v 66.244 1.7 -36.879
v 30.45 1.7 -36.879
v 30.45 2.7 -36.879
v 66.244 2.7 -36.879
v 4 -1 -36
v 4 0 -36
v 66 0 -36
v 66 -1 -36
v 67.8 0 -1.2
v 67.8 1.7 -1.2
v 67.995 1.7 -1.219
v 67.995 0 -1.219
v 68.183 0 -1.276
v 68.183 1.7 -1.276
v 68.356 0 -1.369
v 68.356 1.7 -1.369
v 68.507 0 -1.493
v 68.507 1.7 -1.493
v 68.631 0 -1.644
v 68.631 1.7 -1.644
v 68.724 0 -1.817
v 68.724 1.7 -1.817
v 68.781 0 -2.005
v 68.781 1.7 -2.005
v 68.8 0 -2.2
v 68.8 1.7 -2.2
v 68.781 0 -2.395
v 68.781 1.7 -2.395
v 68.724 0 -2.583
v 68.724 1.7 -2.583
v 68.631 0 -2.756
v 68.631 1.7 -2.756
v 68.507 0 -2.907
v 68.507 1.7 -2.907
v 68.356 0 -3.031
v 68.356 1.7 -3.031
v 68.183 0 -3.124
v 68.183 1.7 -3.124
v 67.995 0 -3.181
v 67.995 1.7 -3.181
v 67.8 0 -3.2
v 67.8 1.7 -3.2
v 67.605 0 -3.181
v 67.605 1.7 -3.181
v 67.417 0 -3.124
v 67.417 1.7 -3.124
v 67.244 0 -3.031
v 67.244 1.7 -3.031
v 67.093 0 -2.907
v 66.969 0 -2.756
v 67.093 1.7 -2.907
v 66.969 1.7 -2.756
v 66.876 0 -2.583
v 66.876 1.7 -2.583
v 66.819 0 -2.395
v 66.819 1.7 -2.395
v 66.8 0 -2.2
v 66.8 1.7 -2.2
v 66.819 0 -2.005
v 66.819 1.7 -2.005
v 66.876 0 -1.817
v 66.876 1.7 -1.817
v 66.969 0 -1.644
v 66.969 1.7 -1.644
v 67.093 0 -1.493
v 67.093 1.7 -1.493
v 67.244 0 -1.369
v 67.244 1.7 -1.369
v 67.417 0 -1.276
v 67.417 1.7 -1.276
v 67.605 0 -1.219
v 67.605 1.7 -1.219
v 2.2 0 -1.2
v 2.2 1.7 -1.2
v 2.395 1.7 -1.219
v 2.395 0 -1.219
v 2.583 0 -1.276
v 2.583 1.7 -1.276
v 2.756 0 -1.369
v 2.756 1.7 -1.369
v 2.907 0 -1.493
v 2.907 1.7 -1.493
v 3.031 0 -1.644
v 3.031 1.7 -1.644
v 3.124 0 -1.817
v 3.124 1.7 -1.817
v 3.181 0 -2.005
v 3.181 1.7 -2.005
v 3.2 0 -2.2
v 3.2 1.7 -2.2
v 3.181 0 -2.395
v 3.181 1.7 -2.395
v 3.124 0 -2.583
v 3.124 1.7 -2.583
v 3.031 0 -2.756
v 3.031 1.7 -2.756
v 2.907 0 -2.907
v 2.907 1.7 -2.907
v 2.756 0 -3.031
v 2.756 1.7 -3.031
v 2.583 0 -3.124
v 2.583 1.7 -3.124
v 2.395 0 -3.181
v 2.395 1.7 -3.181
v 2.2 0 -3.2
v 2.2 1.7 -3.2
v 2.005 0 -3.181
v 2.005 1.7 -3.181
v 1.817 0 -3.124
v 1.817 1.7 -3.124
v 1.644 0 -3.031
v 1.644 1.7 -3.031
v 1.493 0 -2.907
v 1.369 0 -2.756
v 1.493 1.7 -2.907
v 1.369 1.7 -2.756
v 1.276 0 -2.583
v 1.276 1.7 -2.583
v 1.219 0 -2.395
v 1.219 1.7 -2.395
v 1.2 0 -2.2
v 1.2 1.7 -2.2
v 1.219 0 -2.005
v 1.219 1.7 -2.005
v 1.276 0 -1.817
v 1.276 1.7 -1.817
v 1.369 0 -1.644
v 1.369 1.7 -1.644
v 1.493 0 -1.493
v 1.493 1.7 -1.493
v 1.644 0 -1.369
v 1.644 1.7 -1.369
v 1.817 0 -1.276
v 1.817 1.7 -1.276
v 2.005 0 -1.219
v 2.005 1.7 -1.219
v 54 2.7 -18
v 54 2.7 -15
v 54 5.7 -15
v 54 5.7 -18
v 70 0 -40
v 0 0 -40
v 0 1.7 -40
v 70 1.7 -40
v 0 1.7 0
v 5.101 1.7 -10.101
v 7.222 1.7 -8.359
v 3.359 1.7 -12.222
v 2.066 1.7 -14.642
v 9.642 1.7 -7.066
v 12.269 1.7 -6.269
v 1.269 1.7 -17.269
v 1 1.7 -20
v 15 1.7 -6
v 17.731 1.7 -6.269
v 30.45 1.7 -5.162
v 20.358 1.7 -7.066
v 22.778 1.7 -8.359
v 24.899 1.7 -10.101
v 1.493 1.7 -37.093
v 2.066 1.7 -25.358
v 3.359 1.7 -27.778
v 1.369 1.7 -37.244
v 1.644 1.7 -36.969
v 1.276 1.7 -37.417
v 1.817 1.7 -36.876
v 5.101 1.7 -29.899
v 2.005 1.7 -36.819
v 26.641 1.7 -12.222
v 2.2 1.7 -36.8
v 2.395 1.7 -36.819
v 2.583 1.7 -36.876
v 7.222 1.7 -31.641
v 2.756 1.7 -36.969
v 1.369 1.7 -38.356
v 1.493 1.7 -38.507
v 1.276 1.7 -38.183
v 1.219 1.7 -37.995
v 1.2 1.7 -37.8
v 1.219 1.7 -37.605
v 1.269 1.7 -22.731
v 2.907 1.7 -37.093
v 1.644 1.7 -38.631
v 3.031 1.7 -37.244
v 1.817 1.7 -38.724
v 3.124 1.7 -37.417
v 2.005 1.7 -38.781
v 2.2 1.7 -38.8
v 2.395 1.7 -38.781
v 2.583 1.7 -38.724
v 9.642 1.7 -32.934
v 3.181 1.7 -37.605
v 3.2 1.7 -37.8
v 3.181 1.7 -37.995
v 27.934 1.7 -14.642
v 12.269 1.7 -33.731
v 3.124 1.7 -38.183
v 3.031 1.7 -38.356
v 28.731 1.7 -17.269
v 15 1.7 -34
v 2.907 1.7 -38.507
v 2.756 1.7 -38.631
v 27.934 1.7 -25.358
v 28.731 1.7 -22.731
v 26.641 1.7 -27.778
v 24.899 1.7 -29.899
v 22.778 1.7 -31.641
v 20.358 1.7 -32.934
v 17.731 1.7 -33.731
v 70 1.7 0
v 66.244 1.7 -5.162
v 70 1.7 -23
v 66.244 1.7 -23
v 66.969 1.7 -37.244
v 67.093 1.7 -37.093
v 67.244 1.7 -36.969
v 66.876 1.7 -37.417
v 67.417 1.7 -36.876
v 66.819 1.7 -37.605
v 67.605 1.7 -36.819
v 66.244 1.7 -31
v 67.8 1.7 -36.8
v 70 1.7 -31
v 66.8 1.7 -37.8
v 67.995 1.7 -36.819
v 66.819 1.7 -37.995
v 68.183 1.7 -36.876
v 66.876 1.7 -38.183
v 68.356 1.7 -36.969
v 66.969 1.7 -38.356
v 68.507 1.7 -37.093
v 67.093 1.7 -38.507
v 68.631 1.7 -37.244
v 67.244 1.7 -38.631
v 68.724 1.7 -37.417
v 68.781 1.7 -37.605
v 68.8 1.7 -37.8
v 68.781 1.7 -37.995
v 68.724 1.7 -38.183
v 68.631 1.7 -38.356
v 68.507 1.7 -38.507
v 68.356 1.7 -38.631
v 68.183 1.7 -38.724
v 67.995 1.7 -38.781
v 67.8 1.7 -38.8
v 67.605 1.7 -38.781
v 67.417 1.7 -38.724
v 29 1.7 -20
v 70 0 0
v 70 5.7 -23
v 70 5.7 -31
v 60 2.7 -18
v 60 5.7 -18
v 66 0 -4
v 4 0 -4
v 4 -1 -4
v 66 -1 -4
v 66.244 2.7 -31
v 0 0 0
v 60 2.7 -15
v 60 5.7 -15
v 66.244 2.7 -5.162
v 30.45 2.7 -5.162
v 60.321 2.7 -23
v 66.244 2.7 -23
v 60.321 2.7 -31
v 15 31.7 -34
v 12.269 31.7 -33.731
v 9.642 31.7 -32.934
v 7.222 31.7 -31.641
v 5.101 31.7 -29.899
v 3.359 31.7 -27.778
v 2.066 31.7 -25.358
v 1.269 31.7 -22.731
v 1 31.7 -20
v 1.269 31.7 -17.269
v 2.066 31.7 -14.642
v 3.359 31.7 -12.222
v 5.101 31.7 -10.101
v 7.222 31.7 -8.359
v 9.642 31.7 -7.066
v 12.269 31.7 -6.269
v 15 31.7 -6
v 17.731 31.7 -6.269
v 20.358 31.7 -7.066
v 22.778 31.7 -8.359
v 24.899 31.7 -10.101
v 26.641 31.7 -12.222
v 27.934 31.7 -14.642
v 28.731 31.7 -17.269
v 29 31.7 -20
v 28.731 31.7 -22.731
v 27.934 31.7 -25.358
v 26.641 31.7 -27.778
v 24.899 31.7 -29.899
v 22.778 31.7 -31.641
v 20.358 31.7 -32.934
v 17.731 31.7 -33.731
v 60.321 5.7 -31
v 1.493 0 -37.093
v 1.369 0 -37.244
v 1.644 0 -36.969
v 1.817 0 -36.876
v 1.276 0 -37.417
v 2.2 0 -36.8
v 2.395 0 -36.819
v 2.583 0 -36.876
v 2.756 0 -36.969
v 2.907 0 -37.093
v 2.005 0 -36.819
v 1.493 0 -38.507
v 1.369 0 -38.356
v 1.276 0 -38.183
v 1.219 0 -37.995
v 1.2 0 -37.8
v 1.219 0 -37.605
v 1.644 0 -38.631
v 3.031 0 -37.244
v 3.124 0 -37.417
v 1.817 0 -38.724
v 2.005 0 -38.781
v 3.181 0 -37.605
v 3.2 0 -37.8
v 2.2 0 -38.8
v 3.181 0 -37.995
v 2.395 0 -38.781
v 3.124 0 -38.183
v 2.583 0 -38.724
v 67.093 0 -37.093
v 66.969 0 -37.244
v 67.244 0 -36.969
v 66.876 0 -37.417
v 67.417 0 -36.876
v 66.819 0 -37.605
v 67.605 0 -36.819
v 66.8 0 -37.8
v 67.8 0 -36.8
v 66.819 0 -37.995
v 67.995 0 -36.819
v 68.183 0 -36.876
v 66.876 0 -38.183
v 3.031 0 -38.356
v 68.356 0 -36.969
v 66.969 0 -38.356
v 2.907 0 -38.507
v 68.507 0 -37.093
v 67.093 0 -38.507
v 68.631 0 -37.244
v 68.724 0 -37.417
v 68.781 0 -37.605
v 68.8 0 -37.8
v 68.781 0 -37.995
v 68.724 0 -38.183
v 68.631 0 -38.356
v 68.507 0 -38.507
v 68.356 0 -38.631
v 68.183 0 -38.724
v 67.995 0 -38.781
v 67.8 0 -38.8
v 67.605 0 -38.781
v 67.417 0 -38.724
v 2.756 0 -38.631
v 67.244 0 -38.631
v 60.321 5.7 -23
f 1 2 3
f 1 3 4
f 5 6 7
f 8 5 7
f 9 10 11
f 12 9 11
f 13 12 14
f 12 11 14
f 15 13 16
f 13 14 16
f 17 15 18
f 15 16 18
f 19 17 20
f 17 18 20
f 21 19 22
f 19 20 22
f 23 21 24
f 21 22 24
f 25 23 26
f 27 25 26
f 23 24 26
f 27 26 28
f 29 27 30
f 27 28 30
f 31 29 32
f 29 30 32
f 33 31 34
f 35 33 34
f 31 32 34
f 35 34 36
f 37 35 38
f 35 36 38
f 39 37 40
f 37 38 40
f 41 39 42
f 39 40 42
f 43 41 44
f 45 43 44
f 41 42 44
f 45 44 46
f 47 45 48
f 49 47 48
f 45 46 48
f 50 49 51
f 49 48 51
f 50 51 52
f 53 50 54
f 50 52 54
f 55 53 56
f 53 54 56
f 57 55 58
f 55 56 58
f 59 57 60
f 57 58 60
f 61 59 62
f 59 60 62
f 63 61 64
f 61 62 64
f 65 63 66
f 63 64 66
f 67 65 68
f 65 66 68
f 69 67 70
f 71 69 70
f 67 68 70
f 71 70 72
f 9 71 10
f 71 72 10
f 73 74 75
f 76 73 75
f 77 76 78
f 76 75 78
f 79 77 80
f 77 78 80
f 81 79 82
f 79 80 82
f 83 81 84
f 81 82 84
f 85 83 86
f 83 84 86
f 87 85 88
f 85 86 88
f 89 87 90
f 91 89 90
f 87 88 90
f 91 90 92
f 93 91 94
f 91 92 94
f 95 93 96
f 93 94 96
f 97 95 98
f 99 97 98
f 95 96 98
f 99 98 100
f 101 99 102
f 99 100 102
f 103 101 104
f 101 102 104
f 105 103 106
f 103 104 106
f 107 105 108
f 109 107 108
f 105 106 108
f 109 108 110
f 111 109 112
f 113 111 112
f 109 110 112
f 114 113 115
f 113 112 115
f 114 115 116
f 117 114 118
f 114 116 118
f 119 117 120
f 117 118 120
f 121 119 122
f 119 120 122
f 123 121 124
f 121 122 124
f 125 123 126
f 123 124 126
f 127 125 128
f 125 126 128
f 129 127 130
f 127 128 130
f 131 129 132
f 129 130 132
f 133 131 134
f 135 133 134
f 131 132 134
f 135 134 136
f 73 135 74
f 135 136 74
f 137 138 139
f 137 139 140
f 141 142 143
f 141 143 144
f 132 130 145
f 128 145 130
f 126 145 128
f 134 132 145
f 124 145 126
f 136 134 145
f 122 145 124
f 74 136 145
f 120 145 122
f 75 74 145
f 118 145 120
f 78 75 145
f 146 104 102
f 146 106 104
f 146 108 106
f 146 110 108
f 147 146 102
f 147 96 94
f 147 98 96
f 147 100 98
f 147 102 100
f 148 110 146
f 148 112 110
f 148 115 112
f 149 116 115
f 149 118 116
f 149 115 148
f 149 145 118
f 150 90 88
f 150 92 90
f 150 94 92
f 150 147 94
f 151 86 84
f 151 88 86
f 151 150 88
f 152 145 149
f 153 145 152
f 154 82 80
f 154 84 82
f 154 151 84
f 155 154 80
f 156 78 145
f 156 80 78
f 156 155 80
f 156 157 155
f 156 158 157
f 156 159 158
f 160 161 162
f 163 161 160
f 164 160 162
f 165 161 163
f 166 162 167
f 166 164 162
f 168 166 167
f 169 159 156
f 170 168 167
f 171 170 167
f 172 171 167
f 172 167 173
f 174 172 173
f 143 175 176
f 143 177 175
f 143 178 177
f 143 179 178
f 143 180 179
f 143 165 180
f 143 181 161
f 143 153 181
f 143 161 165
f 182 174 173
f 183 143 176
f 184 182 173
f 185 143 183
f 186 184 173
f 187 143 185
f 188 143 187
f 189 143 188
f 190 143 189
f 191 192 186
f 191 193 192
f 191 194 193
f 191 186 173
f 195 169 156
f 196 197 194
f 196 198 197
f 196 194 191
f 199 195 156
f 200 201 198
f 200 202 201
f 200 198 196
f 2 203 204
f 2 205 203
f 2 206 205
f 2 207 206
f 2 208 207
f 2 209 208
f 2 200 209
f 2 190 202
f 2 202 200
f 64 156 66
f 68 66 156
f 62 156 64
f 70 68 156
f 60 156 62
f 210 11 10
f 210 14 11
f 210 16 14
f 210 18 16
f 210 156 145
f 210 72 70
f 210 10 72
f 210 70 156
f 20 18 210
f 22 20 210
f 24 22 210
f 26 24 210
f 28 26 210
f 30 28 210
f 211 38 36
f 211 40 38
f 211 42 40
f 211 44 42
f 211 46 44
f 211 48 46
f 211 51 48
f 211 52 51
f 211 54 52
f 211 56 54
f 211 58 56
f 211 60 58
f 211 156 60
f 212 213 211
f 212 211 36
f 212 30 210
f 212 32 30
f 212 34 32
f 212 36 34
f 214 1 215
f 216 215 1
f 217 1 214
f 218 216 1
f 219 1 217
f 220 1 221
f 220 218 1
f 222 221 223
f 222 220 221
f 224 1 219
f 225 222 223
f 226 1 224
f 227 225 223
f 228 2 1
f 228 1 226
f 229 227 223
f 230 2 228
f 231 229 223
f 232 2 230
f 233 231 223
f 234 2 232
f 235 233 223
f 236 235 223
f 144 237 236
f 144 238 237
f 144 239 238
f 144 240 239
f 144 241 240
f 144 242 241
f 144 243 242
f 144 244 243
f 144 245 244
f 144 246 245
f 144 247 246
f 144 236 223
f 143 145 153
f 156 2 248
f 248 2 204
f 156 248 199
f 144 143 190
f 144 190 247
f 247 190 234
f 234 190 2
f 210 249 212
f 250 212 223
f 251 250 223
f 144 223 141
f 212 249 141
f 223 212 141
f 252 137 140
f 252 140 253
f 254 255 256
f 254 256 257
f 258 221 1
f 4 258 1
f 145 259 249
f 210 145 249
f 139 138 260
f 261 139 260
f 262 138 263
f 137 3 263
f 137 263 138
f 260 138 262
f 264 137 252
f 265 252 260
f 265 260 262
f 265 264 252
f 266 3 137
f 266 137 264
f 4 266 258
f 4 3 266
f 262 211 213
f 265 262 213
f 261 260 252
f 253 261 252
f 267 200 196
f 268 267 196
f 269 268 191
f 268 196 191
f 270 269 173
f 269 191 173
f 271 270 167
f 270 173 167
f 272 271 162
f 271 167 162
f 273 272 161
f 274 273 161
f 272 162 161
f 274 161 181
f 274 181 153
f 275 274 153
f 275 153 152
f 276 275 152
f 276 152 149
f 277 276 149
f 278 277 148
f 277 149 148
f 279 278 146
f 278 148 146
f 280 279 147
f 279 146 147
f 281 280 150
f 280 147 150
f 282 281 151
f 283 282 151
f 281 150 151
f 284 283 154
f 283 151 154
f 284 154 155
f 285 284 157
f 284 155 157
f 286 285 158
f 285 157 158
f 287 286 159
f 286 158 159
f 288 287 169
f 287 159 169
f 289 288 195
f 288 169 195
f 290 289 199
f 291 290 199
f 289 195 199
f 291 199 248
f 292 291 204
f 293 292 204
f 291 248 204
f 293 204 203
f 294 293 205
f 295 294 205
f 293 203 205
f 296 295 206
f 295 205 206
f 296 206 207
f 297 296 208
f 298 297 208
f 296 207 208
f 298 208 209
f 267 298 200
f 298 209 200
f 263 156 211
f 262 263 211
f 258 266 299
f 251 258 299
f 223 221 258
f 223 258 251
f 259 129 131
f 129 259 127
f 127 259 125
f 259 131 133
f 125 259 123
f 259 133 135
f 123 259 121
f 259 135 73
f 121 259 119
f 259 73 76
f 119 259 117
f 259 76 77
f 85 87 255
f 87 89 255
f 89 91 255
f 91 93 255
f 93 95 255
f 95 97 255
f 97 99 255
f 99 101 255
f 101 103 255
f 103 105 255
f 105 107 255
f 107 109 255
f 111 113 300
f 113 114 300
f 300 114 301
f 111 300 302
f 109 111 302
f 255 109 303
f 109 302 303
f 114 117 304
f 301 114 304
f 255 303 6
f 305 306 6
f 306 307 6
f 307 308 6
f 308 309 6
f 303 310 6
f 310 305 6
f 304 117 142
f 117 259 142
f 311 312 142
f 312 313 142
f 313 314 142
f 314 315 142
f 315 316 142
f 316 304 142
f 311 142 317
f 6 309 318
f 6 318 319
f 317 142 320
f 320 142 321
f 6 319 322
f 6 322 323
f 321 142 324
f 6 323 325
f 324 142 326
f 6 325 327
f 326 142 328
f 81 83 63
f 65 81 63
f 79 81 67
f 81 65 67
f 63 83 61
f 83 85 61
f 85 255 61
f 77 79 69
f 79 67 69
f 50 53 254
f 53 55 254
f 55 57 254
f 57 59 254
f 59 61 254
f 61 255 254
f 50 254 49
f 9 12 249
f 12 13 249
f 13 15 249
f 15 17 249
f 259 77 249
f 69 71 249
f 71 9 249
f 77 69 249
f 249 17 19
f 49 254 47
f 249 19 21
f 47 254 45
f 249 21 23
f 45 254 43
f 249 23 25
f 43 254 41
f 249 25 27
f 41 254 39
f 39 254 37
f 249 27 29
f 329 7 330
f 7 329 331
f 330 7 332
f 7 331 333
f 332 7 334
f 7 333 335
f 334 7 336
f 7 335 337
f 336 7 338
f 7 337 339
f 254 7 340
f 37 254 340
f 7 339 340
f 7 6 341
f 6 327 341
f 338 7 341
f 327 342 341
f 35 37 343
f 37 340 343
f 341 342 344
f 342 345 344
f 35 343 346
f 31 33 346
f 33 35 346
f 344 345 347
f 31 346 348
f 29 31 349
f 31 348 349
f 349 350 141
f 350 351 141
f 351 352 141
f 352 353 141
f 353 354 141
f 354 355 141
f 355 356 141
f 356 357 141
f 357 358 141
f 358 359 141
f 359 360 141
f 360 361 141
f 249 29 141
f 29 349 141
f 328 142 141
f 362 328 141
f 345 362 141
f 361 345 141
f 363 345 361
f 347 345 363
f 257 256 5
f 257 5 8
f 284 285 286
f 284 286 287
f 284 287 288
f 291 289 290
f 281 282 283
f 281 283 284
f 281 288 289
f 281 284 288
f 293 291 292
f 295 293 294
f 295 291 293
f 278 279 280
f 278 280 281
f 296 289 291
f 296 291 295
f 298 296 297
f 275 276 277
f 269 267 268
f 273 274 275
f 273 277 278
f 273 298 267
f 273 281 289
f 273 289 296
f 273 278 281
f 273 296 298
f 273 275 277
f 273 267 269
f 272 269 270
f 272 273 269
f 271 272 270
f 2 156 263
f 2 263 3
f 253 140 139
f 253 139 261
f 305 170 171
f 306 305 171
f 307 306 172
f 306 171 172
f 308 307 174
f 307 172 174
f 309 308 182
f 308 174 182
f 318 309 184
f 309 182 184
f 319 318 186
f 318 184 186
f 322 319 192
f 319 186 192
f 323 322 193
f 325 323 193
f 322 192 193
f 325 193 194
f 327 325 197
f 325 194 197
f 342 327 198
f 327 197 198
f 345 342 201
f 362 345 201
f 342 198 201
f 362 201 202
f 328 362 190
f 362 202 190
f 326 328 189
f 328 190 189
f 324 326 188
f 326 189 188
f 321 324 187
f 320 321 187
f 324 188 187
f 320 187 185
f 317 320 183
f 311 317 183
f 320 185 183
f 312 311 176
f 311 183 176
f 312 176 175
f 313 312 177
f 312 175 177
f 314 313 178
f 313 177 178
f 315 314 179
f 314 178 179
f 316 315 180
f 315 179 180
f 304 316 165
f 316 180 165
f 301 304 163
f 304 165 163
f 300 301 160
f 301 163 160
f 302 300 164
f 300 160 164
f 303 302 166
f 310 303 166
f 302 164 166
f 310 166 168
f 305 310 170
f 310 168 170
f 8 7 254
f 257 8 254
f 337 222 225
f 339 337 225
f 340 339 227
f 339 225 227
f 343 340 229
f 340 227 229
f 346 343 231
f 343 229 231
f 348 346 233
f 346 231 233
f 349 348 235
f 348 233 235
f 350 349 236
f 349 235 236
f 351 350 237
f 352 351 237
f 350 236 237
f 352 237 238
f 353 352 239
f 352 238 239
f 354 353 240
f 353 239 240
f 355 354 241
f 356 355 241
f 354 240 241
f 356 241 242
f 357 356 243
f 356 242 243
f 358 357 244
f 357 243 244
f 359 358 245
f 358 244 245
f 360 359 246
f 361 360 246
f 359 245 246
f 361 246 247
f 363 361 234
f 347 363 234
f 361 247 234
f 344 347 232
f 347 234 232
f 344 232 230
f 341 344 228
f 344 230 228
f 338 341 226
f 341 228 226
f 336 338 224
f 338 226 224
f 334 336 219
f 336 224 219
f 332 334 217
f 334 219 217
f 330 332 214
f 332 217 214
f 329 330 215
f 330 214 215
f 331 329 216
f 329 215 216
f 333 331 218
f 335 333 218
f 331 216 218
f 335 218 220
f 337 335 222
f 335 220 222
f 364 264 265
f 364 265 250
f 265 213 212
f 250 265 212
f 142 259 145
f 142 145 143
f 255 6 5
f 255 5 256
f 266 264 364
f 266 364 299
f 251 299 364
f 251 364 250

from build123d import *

# Parameters (mm, degrees)
SKETCH1_W           = 70
SKETCH1_H           = 40
BOSS_EXTRUDE1_DEPTH = 1.7
SKETCH2_R           = 1
CUT_EXTRUDE1_DEPTH  = 1.7
SKETCH3_R           = 14
BOSS_EXTRUDE2_DEPTH = 30
SKETCH4_W           = 9.678505403
SKETCH4_H           = 8
BOSS_EXTRUDE3_DEPTH = 4
SKETCH5_W           = 6
SKETCH5_H           = 3
BOSS_EXTRUDE4_DEPTH = 4
SKETCH6_W           = 62
SKETCH6_H           = 32
BOSS_EXTRUDE5_DEPTH = 1
SKETCH7_W           = 35.794081109
SKETCH7_H           = 31.717706103
BOSS_EXTRUDE6_DEPTH = 1


with BuildPart() as part:
    # Sketch1 → Boss-Extrude1 (new body)
    with BuildSketch(Plane(origin=(0, 0, 0), x_dir=(1, 0, 0), z_dir=(0, 1, 0))):
        with Locations((35, 20)):
            Rectangle(SKETCH1_W, SKETCH1_H)
    extrude(amount=BOSS_EXTRUDE1_DEPTH)

    # Sketch2 → Cut-Extrude1 (cut)
    with BuildSketch(Plane(origin=(0, 1.7, 0), x_dir=(1, 0, 0), z_dir=(0, 1, 0))):
        with Locations(Location((67.8, 37.8, 0), (0, 0, 270))):
            Circle(SKETCH2_R)
        with Locations(Location((2.2, 37.8, 0), (0, 0, 270))):
            Circle(SKETCH2_R)
        with Locations(Location((2.2, 2.2, 0), (0, 0, 270))):
            Circle(SKETCH2_R)
        with Locations(Location((67.8, 2.2, 0), (0, 0, 270))):
            Circle(SKETCH2_R)
    extrude(amount=-CUT_EXTRUDE1_DEPTH, mode=Mode.SUBTRACT)

    # Sketch3 → Boss-Extrude2 (add)
    with BuildSketch(Plane(origin=(0, 1.7, 0), x_dir=(1, 0, 0), z_dir=(0, 1, 0))):
        with Locations(Location((15, 20, 0), (0, 0, 90))):
            Circle(SKETCH3_R)
    extrude(amount=BOSS_EXTRUDE2_DEPTH)

    # Sketch4 → Boss-Extrude3 (add)
    with BuildSketch(Plane(origin=(0, 1.7, 0), x_dir=(1, 0, 0), z_dir=(0, 1, 0))):
        with Locations((65.160747298, 27)):
            Rectangle(SKETCH4_W, SKETCH4_H)
    extrude(amount=BOSS_EXTRUDE3_DEPTH)

    # Sketch5 → Boss-Extrude4 (add)
    with BuildSketch(Plane(origin=(0, 1.7, 0), x_dir=(1, 0, 0), z_dir=(0, 1, 0))):
        with Locations((57, 16.5)):
            Rectangle(SKETCH5_W, SKETCH5_H)
    extrude(amount=BOSS_EXTRUDE4_DEPTH)

    # Sketch6 → Boss-Extrude5 (add)
    with BuildSketch(Plane.XZ):
        with Locations((35, -20)):
            Rectangle(SKETCH6_W, SKETCH6_H)
    extrude(amount=BOSS_EXTRUDE5_DEPTH)

    # Sketch7 → Boss-Extrude6 (add)
    with BuildSketch(Plane(origin=(0, 1.7, 0), x_dir=(1, 0, 0), z_dir=(0, 1, 0))):
        with Locations((48.346916126, 21.020495195)):
            Rectangle(SKETCH7_W, SKETCH7_H)
    extrude(amount=BOSS_EXTRUDE6_DEPTH)


solid = part.part
